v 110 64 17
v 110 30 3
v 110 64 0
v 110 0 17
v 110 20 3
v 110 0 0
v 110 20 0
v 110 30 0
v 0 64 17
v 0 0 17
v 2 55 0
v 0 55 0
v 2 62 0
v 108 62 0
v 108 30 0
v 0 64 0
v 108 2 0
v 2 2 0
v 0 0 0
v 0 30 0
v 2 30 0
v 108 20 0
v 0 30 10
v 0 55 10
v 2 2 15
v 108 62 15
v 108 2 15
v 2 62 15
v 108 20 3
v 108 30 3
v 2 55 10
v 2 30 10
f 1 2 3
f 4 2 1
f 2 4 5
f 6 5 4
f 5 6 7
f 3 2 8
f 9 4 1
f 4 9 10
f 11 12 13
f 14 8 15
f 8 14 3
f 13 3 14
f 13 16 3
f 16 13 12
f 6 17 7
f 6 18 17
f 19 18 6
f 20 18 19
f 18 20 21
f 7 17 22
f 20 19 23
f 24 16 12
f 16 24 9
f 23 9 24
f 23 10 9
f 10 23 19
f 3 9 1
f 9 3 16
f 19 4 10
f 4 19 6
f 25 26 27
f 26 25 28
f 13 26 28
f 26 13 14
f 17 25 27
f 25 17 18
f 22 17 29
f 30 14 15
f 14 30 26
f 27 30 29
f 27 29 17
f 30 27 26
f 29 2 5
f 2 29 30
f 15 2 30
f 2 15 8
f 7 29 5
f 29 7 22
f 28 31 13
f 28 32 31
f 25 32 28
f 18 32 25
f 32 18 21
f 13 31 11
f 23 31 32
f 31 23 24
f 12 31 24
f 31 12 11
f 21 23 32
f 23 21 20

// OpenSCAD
// Esterno
difference() {
    cube([110, 64, 17]);
    #translate([0, 2])cube([110, 60, 15]);
}


// Retro
difference(){
    difference(){
        #translate([90, 0])cube([20, 64, 17]);
        #translate([90, 2])cube([18, 60, 15]);
    }
    #translate([108, 20])cube([2, 10, 3]);
}


// Fronte
difference(){
    difference(){
        #translate([0, 0])cube([20, 64, 17]);
        #translate([2, 2])cube([18, 60, 15]);
    }
    #translate([0, 30])cube([2, 25, 10]);
}


// I need a 110x60x15 EFFECTIVE.
// 0-2, (2-3)buco, 3-6 sul retro. Altezza 3mm
// 0-3, (3-5.5)buco, 5.5-6 fronte. Altezza 10mm 
